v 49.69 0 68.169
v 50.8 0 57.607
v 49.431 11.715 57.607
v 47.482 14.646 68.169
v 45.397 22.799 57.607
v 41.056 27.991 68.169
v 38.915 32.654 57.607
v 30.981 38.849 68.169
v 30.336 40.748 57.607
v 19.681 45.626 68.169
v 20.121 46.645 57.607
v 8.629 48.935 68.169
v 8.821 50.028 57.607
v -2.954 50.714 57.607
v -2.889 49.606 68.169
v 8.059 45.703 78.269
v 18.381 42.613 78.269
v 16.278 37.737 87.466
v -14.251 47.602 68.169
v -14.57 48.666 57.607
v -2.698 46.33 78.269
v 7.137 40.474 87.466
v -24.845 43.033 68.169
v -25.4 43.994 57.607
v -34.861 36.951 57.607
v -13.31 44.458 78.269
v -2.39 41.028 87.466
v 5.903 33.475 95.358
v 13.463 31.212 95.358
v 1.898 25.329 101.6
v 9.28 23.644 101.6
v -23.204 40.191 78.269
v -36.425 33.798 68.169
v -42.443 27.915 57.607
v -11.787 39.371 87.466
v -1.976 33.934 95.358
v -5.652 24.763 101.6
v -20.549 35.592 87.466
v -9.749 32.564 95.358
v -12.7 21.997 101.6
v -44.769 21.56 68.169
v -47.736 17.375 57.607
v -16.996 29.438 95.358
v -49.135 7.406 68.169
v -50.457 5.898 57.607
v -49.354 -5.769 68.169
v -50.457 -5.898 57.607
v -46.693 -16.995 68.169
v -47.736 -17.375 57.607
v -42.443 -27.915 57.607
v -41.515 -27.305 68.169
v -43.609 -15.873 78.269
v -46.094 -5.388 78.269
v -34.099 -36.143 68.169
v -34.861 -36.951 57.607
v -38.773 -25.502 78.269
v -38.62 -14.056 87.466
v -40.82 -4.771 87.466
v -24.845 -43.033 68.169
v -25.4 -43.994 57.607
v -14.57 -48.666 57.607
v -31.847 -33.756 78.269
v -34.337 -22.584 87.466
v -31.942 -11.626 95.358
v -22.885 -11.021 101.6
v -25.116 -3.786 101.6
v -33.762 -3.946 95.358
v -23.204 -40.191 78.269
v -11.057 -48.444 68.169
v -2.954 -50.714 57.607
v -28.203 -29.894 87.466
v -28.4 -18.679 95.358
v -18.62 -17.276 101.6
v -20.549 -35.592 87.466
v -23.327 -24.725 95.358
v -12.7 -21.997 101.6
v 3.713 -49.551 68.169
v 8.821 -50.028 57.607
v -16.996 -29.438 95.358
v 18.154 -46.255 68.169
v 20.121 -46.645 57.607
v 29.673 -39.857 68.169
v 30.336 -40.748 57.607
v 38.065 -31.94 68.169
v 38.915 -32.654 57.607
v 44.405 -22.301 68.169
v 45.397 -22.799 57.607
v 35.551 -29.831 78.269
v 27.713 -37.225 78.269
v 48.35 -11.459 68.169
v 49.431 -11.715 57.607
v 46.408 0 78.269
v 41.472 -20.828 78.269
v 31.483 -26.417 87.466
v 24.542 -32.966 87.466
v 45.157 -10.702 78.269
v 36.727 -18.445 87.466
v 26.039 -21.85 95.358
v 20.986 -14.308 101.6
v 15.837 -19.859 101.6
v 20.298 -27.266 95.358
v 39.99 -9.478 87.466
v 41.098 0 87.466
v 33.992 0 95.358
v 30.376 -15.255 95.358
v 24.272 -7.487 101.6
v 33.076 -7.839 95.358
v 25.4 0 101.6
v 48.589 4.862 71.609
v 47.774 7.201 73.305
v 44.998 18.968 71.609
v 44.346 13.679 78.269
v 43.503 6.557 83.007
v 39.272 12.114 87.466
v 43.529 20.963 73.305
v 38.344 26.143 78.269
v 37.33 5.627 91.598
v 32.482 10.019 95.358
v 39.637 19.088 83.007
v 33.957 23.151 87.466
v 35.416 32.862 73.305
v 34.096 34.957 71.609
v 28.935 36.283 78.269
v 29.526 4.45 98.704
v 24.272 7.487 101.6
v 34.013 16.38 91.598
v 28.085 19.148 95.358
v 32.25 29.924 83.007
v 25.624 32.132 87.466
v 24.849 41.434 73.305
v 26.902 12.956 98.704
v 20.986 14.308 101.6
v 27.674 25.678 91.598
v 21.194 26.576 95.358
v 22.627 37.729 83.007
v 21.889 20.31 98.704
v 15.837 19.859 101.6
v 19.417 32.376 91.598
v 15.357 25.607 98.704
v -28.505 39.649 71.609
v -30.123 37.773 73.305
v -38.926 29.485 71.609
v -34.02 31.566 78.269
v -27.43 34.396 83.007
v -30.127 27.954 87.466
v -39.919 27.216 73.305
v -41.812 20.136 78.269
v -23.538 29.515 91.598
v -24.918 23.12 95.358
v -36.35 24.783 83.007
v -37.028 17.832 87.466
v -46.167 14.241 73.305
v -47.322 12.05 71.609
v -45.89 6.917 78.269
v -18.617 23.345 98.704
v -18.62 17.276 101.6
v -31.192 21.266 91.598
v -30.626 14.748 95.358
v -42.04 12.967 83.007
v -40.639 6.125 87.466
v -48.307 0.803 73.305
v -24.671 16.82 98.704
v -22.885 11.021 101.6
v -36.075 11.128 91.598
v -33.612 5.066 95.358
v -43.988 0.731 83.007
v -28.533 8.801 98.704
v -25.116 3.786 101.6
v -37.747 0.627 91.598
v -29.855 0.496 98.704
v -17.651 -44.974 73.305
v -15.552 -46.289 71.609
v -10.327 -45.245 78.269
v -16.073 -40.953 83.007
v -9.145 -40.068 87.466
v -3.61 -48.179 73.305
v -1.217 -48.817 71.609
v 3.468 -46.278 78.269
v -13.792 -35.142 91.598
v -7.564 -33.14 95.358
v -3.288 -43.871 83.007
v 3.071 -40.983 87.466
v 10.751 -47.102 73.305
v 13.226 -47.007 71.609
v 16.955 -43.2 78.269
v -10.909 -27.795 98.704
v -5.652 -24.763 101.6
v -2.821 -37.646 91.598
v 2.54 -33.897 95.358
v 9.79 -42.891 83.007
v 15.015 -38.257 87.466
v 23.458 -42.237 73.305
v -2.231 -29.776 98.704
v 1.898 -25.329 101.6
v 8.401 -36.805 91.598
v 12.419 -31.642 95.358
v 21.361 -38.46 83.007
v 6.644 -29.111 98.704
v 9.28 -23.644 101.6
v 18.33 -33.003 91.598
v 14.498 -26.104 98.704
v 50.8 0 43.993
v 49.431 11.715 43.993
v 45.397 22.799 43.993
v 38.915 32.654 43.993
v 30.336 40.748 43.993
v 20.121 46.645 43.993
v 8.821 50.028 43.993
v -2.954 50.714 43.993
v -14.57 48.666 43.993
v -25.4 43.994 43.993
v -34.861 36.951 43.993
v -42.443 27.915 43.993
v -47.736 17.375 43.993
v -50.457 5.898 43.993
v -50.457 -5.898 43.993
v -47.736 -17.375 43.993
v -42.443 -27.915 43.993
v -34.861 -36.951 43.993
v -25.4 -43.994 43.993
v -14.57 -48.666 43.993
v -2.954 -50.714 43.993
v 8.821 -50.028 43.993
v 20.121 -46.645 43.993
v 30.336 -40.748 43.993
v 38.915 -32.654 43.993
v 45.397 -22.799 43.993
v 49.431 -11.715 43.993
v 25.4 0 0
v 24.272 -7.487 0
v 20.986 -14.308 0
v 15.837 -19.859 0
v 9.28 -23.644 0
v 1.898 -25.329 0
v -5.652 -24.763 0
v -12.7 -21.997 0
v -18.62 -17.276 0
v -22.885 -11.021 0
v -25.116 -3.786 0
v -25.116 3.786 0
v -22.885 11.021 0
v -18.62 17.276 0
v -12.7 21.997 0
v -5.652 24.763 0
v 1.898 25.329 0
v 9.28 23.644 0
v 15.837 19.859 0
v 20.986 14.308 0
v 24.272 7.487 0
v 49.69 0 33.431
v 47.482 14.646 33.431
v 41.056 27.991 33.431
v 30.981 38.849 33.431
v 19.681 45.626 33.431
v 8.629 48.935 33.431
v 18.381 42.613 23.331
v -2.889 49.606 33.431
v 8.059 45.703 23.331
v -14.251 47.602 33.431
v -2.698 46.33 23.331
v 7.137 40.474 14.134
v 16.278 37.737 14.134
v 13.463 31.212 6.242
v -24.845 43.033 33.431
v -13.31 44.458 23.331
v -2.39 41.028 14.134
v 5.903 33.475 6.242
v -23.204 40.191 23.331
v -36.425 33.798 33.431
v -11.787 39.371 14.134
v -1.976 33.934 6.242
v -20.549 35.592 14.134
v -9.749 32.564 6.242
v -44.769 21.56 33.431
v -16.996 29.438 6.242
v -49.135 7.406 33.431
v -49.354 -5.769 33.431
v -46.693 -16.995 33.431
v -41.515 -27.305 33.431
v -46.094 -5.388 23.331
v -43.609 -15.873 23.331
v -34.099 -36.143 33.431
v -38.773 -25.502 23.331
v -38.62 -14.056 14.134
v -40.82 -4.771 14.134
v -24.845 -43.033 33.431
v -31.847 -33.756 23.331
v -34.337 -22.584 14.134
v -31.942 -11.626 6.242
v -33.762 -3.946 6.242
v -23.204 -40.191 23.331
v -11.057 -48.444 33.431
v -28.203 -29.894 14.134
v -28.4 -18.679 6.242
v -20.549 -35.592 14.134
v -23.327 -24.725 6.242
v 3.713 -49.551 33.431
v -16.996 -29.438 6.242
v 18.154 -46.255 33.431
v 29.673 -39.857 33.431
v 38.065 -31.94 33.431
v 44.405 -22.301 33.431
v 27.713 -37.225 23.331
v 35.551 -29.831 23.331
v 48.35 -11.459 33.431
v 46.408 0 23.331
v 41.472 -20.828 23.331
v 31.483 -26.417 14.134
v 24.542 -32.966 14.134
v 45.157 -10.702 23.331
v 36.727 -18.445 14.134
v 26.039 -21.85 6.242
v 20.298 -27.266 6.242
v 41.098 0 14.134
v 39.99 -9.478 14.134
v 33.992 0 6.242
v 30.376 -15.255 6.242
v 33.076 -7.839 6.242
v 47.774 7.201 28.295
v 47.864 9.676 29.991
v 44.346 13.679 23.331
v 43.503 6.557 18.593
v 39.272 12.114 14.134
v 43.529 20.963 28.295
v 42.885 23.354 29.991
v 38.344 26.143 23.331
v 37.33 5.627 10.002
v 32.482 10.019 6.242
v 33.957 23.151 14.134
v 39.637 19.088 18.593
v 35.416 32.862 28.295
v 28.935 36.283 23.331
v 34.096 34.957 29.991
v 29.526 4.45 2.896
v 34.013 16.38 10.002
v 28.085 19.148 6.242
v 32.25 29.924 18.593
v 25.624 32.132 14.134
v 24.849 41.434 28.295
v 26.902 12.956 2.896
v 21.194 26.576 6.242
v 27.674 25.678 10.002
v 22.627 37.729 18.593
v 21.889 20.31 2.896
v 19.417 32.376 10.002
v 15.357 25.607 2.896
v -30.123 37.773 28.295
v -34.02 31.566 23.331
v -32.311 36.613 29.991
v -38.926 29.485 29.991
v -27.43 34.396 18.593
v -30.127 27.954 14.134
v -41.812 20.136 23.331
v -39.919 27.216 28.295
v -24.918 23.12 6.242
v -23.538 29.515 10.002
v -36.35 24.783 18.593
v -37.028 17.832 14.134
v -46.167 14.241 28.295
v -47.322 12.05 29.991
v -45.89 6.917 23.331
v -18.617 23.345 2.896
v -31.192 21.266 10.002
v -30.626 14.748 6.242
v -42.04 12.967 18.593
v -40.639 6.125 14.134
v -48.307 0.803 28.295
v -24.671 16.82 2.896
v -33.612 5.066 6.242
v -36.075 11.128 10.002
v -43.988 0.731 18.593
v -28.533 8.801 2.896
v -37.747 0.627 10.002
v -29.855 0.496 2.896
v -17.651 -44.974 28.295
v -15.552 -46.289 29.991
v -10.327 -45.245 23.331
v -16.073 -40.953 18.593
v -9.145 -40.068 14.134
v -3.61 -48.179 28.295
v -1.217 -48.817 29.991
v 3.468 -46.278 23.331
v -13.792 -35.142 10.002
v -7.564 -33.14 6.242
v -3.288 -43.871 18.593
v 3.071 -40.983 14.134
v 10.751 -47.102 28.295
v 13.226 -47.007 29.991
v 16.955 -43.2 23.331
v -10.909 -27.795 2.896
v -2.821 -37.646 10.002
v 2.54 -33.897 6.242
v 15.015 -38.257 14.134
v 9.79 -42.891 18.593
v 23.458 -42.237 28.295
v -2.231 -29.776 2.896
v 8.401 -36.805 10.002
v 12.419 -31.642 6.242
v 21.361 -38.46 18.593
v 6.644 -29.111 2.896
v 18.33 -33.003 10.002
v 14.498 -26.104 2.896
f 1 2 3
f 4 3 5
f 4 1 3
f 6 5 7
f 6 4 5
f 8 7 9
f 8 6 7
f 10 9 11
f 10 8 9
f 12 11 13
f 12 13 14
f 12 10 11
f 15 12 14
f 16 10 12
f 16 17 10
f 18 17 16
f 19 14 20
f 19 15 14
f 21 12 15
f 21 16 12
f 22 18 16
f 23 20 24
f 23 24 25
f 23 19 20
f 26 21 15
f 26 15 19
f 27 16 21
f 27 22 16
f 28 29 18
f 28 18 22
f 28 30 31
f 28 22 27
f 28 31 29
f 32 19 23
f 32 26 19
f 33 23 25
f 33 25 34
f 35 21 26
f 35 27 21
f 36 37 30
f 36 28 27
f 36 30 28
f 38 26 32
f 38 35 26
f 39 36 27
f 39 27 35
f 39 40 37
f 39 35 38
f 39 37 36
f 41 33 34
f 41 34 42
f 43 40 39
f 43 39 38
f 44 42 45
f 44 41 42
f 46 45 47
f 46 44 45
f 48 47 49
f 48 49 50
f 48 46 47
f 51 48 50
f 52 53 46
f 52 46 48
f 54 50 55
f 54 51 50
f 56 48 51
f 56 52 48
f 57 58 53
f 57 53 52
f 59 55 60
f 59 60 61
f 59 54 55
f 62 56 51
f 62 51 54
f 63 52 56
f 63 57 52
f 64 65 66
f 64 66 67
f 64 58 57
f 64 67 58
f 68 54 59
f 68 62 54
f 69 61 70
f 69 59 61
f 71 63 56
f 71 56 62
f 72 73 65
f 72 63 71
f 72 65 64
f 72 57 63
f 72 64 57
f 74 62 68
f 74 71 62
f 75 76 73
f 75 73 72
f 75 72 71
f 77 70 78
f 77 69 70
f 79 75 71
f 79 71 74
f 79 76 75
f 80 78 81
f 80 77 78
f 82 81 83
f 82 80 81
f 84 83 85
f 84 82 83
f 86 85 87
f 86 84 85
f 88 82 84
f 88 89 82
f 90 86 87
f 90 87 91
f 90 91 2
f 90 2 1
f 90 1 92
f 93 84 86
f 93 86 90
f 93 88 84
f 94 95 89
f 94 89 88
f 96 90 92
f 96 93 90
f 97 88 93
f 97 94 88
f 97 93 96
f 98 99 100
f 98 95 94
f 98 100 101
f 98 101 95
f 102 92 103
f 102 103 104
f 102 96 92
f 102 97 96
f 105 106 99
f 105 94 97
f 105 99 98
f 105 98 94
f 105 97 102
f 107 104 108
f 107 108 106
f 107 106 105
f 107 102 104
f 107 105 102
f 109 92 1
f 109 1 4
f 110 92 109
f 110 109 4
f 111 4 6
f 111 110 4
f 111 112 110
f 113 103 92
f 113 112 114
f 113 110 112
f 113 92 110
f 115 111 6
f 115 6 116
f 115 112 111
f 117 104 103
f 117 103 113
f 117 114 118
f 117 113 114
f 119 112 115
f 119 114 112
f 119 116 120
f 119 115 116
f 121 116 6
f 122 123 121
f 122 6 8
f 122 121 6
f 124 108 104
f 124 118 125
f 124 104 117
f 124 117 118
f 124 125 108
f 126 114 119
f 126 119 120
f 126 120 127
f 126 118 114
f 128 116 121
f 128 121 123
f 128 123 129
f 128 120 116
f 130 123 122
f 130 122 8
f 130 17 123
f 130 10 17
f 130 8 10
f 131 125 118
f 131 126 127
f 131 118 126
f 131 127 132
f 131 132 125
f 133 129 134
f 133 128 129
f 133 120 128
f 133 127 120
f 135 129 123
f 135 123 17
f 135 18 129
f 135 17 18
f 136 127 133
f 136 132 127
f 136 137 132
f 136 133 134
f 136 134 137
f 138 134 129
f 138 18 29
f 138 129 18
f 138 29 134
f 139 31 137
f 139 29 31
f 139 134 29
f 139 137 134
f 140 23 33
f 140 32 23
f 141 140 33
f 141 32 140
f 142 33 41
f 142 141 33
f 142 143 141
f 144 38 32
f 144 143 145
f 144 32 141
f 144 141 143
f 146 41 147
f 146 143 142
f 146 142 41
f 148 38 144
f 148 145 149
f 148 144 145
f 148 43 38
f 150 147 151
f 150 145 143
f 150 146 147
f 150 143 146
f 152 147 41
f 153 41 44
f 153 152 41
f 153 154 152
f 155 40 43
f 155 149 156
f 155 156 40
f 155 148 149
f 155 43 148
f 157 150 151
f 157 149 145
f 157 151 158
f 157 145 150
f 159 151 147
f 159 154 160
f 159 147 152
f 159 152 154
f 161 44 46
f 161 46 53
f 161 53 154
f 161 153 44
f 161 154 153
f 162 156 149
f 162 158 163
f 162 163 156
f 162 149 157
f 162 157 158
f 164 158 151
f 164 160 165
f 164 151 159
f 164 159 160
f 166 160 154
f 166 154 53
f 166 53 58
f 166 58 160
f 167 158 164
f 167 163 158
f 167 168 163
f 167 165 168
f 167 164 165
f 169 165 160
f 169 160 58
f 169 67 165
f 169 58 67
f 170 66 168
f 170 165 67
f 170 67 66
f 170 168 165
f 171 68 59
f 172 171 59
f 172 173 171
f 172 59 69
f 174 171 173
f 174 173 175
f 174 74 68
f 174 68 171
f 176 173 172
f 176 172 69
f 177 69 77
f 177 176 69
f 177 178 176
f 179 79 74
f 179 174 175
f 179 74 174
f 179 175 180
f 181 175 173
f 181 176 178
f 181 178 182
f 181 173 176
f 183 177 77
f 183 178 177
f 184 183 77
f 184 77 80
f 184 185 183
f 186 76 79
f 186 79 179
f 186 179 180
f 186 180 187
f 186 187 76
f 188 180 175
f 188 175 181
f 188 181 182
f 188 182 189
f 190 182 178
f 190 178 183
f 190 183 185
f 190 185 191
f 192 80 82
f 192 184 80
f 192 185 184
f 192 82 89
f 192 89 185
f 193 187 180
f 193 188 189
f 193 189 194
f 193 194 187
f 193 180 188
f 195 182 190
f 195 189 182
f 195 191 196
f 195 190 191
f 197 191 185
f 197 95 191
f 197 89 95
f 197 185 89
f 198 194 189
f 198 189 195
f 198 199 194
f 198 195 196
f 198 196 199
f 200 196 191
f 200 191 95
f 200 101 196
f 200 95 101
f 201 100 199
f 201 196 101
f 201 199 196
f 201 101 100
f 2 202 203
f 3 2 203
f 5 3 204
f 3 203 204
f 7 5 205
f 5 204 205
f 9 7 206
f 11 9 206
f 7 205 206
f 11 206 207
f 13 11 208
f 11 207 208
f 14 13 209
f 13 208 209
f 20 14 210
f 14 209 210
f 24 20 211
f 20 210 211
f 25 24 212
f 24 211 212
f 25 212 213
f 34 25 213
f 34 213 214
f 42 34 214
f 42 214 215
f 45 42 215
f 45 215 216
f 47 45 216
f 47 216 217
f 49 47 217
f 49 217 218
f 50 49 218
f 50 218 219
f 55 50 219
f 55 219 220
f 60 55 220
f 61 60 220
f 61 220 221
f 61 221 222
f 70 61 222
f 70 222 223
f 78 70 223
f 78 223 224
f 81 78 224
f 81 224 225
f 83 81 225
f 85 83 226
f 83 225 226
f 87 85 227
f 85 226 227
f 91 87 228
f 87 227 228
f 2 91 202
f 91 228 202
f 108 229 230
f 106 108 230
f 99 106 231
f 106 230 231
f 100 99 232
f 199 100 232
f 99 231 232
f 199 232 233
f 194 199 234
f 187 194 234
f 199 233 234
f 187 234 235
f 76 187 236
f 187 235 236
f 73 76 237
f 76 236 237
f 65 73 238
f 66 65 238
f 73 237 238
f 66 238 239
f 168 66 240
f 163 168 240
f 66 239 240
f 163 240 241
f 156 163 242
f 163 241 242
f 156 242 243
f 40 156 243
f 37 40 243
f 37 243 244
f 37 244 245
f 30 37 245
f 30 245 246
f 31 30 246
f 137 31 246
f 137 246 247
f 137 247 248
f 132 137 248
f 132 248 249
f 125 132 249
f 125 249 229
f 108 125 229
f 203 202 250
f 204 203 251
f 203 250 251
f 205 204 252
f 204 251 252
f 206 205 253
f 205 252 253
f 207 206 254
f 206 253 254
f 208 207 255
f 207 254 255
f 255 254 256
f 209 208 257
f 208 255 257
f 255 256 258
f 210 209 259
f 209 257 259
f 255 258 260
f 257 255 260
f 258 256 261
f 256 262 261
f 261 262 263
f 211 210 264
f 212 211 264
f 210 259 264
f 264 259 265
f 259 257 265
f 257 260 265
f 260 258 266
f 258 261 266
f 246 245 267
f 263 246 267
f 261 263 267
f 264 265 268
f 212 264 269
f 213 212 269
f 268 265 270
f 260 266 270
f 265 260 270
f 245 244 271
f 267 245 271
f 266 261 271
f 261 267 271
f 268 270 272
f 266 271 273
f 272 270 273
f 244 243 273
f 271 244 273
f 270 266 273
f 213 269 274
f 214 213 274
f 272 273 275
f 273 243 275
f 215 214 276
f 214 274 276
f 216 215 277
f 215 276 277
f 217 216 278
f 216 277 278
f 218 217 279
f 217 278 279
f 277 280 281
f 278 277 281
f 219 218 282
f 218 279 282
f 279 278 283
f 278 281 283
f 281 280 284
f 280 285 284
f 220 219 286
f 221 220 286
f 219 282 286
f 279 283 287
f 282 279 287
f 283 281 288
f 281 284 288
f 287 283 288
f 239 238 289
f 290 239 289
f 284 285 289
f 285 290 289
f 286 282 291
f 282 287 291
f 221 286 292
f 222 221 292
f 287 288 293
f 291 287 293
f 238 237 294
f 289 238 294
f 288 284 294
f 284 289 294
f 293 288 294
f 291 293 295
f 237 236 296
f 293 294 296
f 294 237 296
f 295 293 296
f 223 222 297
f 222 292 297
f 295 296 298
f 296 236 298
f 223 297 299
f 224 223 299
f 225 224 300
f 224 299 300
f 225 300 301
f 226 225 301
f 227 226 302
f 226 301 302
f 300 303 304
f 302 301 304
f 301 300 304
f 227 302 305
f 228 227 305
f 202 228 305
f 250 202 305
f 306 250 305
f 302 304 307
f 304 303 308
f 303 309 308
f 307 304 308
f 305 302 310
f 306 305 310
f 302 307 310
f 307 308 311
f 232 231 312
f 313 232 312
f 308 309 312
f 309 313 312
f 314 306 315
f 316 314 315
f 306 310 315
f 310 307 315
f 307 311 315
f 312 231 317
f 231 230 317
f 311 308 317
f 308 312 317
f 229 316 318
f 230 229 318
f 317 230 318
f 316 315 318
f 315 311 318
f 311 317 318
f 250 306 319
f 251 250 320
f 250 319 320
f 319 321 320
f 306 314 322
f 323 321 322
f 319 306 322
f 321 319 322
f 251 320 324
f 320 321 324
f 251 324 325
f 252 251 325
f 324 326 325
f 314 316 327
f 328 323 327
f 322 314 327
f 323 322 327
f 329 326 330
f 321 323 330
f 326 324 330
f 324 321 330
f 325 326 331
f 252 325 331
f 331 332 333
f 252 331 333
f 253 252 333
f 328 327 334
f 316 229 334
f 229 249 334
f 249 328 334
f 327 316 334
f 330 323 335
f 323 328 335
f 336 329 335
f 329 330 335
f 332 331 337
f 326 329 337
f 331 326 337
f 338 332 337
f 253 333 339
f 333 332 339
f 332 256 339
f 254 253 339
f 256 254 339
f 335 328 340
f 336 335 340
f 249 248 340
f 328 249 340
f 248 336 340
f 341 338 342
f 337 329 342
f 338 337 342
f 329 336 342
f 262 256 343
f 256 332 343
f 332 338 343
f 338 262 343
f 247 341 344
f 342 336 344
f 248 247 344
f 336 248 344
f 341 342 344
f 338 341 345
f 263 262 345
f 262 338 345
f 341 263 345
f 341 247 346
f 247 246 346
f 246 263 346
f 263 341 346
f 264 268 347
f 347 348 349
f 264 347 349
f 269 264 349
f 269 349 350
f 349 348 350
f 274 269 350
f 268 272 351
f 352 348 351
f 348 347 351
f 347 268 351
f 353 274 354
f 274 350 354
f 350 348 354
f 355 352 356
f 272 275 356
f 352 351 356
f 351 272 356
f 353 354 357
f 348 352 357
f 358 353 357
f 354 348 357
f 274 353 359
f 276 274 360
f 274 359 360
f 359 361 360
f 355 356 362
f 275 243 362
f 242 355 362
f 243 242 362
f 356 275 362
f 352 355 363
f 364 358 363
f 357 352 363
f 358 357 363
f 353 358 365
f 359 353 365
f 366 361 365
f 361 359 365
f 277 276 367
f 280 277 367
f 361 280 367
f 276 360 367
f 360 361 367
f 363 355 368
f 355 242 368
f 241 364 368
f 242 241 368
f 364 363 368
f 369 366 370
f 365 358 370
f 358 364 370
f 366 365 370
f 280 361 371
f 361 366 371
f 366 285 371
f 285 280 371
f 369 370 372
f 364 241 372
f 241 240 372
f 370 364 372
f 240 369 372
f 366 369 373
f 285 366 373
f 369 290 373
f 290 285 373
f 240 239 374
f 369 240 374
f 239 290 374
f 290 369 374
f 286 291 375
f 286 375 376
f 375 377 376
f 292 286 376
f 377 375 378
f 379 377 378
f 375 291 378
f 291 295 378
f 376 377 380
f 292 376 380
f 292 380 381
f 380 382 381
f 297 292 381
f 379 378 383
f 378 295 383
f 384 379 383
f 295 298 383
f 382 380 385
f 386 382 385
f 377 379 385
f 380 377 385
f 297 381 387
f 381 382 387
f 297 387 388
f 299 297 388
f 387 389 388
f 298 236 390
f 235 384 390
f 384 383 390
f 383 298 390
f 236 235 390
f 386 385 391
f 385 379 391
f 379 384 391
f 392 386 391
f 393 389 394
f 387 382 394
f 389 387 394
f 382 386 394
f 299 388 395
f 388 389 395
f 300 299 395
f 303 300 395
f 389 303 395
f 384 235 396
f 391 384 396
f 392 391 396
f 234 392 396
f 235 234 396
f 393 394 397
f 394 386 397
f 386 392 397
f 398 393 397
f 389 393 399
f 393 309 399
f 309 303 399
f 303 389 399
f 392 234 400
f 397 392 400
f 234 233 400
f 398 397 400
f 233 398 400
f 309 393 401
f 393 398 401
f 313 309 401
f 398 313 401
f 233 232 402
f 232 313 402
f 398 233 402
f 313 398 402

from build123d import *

# Parameters (mm, degrees)
F1_R     = 25.4
F2_DEPTH = 101.6
F0_R     = 50.8
F3_DEPTH = 101.6
F4_R     = 25.4
F5_DEPTH = 101.601


# Not quite as in the source:
# - a fillet or chamfer that OpenCascade refuses, or shapes differently, is made with other operations: its cross-section is extruded or revolved along the edge and cut away or added


with BuildPart() as f2:
    # F1 (on face) → F2 (new body)
    with BuildSketch(Plane.XY):
        Circle(F1_R)
    extrude(amount=F2_DEPTH)

    # F0 (on Top) → F3 (join)
    with BuildSketch(Plane.XY):
        Circle(F0_R)
    extrude(amount=F3_DEPTH)

    # F4 (on face) → F5 (cut, through all)
    with BuildSketch(Plane(origin=(0, 0, 0), x_dir=(1, 0, 0), z_dir=(0, 0, -1))):
        Circle(F4_R)
    extrude(amount=-F5_DEPTH, mode=Mode.SUBTRACT)

    # F6: fillet of radius 50.79746 on 2 edges, made by hand

    # F6_s1 → F6_t2 (revolve, cut)
    with BuildSketch(Plane.XZ):
        with BuildLine():
            ThreePointArc((50.8, 57.6073759819), (43.9940641888, 83.0067409739), (25.4, 101.6))
            Line((25.4, 101.6), (50.8, 101.6))
            Line((50.8, 101.6), (50.8, 57.6073759819))
        make_face()
    revolve(axis=Axis((0, 0, 101.6), (0, 0, 1)), mode=Mode.SUBTRACT)

    # F6_s3 → F6_t4 (revolve, cut)
    with BuildSketch(Plane.XZ):
        with BuildLine():
            ThreePointArc((50.8, 43.9926240181), (43.9940641888, 18.5932590261), (25.4, 0))
            Line((25.4, 0), (50.8, 0))
            Line((50.8, 0), (50.8, 43.9926240181))
        make_face()
    revolve(axis=Axis((0, 0, 0), (0, 0, 1)), mode=Mode.SUBTRACT)


solid = f2.part
